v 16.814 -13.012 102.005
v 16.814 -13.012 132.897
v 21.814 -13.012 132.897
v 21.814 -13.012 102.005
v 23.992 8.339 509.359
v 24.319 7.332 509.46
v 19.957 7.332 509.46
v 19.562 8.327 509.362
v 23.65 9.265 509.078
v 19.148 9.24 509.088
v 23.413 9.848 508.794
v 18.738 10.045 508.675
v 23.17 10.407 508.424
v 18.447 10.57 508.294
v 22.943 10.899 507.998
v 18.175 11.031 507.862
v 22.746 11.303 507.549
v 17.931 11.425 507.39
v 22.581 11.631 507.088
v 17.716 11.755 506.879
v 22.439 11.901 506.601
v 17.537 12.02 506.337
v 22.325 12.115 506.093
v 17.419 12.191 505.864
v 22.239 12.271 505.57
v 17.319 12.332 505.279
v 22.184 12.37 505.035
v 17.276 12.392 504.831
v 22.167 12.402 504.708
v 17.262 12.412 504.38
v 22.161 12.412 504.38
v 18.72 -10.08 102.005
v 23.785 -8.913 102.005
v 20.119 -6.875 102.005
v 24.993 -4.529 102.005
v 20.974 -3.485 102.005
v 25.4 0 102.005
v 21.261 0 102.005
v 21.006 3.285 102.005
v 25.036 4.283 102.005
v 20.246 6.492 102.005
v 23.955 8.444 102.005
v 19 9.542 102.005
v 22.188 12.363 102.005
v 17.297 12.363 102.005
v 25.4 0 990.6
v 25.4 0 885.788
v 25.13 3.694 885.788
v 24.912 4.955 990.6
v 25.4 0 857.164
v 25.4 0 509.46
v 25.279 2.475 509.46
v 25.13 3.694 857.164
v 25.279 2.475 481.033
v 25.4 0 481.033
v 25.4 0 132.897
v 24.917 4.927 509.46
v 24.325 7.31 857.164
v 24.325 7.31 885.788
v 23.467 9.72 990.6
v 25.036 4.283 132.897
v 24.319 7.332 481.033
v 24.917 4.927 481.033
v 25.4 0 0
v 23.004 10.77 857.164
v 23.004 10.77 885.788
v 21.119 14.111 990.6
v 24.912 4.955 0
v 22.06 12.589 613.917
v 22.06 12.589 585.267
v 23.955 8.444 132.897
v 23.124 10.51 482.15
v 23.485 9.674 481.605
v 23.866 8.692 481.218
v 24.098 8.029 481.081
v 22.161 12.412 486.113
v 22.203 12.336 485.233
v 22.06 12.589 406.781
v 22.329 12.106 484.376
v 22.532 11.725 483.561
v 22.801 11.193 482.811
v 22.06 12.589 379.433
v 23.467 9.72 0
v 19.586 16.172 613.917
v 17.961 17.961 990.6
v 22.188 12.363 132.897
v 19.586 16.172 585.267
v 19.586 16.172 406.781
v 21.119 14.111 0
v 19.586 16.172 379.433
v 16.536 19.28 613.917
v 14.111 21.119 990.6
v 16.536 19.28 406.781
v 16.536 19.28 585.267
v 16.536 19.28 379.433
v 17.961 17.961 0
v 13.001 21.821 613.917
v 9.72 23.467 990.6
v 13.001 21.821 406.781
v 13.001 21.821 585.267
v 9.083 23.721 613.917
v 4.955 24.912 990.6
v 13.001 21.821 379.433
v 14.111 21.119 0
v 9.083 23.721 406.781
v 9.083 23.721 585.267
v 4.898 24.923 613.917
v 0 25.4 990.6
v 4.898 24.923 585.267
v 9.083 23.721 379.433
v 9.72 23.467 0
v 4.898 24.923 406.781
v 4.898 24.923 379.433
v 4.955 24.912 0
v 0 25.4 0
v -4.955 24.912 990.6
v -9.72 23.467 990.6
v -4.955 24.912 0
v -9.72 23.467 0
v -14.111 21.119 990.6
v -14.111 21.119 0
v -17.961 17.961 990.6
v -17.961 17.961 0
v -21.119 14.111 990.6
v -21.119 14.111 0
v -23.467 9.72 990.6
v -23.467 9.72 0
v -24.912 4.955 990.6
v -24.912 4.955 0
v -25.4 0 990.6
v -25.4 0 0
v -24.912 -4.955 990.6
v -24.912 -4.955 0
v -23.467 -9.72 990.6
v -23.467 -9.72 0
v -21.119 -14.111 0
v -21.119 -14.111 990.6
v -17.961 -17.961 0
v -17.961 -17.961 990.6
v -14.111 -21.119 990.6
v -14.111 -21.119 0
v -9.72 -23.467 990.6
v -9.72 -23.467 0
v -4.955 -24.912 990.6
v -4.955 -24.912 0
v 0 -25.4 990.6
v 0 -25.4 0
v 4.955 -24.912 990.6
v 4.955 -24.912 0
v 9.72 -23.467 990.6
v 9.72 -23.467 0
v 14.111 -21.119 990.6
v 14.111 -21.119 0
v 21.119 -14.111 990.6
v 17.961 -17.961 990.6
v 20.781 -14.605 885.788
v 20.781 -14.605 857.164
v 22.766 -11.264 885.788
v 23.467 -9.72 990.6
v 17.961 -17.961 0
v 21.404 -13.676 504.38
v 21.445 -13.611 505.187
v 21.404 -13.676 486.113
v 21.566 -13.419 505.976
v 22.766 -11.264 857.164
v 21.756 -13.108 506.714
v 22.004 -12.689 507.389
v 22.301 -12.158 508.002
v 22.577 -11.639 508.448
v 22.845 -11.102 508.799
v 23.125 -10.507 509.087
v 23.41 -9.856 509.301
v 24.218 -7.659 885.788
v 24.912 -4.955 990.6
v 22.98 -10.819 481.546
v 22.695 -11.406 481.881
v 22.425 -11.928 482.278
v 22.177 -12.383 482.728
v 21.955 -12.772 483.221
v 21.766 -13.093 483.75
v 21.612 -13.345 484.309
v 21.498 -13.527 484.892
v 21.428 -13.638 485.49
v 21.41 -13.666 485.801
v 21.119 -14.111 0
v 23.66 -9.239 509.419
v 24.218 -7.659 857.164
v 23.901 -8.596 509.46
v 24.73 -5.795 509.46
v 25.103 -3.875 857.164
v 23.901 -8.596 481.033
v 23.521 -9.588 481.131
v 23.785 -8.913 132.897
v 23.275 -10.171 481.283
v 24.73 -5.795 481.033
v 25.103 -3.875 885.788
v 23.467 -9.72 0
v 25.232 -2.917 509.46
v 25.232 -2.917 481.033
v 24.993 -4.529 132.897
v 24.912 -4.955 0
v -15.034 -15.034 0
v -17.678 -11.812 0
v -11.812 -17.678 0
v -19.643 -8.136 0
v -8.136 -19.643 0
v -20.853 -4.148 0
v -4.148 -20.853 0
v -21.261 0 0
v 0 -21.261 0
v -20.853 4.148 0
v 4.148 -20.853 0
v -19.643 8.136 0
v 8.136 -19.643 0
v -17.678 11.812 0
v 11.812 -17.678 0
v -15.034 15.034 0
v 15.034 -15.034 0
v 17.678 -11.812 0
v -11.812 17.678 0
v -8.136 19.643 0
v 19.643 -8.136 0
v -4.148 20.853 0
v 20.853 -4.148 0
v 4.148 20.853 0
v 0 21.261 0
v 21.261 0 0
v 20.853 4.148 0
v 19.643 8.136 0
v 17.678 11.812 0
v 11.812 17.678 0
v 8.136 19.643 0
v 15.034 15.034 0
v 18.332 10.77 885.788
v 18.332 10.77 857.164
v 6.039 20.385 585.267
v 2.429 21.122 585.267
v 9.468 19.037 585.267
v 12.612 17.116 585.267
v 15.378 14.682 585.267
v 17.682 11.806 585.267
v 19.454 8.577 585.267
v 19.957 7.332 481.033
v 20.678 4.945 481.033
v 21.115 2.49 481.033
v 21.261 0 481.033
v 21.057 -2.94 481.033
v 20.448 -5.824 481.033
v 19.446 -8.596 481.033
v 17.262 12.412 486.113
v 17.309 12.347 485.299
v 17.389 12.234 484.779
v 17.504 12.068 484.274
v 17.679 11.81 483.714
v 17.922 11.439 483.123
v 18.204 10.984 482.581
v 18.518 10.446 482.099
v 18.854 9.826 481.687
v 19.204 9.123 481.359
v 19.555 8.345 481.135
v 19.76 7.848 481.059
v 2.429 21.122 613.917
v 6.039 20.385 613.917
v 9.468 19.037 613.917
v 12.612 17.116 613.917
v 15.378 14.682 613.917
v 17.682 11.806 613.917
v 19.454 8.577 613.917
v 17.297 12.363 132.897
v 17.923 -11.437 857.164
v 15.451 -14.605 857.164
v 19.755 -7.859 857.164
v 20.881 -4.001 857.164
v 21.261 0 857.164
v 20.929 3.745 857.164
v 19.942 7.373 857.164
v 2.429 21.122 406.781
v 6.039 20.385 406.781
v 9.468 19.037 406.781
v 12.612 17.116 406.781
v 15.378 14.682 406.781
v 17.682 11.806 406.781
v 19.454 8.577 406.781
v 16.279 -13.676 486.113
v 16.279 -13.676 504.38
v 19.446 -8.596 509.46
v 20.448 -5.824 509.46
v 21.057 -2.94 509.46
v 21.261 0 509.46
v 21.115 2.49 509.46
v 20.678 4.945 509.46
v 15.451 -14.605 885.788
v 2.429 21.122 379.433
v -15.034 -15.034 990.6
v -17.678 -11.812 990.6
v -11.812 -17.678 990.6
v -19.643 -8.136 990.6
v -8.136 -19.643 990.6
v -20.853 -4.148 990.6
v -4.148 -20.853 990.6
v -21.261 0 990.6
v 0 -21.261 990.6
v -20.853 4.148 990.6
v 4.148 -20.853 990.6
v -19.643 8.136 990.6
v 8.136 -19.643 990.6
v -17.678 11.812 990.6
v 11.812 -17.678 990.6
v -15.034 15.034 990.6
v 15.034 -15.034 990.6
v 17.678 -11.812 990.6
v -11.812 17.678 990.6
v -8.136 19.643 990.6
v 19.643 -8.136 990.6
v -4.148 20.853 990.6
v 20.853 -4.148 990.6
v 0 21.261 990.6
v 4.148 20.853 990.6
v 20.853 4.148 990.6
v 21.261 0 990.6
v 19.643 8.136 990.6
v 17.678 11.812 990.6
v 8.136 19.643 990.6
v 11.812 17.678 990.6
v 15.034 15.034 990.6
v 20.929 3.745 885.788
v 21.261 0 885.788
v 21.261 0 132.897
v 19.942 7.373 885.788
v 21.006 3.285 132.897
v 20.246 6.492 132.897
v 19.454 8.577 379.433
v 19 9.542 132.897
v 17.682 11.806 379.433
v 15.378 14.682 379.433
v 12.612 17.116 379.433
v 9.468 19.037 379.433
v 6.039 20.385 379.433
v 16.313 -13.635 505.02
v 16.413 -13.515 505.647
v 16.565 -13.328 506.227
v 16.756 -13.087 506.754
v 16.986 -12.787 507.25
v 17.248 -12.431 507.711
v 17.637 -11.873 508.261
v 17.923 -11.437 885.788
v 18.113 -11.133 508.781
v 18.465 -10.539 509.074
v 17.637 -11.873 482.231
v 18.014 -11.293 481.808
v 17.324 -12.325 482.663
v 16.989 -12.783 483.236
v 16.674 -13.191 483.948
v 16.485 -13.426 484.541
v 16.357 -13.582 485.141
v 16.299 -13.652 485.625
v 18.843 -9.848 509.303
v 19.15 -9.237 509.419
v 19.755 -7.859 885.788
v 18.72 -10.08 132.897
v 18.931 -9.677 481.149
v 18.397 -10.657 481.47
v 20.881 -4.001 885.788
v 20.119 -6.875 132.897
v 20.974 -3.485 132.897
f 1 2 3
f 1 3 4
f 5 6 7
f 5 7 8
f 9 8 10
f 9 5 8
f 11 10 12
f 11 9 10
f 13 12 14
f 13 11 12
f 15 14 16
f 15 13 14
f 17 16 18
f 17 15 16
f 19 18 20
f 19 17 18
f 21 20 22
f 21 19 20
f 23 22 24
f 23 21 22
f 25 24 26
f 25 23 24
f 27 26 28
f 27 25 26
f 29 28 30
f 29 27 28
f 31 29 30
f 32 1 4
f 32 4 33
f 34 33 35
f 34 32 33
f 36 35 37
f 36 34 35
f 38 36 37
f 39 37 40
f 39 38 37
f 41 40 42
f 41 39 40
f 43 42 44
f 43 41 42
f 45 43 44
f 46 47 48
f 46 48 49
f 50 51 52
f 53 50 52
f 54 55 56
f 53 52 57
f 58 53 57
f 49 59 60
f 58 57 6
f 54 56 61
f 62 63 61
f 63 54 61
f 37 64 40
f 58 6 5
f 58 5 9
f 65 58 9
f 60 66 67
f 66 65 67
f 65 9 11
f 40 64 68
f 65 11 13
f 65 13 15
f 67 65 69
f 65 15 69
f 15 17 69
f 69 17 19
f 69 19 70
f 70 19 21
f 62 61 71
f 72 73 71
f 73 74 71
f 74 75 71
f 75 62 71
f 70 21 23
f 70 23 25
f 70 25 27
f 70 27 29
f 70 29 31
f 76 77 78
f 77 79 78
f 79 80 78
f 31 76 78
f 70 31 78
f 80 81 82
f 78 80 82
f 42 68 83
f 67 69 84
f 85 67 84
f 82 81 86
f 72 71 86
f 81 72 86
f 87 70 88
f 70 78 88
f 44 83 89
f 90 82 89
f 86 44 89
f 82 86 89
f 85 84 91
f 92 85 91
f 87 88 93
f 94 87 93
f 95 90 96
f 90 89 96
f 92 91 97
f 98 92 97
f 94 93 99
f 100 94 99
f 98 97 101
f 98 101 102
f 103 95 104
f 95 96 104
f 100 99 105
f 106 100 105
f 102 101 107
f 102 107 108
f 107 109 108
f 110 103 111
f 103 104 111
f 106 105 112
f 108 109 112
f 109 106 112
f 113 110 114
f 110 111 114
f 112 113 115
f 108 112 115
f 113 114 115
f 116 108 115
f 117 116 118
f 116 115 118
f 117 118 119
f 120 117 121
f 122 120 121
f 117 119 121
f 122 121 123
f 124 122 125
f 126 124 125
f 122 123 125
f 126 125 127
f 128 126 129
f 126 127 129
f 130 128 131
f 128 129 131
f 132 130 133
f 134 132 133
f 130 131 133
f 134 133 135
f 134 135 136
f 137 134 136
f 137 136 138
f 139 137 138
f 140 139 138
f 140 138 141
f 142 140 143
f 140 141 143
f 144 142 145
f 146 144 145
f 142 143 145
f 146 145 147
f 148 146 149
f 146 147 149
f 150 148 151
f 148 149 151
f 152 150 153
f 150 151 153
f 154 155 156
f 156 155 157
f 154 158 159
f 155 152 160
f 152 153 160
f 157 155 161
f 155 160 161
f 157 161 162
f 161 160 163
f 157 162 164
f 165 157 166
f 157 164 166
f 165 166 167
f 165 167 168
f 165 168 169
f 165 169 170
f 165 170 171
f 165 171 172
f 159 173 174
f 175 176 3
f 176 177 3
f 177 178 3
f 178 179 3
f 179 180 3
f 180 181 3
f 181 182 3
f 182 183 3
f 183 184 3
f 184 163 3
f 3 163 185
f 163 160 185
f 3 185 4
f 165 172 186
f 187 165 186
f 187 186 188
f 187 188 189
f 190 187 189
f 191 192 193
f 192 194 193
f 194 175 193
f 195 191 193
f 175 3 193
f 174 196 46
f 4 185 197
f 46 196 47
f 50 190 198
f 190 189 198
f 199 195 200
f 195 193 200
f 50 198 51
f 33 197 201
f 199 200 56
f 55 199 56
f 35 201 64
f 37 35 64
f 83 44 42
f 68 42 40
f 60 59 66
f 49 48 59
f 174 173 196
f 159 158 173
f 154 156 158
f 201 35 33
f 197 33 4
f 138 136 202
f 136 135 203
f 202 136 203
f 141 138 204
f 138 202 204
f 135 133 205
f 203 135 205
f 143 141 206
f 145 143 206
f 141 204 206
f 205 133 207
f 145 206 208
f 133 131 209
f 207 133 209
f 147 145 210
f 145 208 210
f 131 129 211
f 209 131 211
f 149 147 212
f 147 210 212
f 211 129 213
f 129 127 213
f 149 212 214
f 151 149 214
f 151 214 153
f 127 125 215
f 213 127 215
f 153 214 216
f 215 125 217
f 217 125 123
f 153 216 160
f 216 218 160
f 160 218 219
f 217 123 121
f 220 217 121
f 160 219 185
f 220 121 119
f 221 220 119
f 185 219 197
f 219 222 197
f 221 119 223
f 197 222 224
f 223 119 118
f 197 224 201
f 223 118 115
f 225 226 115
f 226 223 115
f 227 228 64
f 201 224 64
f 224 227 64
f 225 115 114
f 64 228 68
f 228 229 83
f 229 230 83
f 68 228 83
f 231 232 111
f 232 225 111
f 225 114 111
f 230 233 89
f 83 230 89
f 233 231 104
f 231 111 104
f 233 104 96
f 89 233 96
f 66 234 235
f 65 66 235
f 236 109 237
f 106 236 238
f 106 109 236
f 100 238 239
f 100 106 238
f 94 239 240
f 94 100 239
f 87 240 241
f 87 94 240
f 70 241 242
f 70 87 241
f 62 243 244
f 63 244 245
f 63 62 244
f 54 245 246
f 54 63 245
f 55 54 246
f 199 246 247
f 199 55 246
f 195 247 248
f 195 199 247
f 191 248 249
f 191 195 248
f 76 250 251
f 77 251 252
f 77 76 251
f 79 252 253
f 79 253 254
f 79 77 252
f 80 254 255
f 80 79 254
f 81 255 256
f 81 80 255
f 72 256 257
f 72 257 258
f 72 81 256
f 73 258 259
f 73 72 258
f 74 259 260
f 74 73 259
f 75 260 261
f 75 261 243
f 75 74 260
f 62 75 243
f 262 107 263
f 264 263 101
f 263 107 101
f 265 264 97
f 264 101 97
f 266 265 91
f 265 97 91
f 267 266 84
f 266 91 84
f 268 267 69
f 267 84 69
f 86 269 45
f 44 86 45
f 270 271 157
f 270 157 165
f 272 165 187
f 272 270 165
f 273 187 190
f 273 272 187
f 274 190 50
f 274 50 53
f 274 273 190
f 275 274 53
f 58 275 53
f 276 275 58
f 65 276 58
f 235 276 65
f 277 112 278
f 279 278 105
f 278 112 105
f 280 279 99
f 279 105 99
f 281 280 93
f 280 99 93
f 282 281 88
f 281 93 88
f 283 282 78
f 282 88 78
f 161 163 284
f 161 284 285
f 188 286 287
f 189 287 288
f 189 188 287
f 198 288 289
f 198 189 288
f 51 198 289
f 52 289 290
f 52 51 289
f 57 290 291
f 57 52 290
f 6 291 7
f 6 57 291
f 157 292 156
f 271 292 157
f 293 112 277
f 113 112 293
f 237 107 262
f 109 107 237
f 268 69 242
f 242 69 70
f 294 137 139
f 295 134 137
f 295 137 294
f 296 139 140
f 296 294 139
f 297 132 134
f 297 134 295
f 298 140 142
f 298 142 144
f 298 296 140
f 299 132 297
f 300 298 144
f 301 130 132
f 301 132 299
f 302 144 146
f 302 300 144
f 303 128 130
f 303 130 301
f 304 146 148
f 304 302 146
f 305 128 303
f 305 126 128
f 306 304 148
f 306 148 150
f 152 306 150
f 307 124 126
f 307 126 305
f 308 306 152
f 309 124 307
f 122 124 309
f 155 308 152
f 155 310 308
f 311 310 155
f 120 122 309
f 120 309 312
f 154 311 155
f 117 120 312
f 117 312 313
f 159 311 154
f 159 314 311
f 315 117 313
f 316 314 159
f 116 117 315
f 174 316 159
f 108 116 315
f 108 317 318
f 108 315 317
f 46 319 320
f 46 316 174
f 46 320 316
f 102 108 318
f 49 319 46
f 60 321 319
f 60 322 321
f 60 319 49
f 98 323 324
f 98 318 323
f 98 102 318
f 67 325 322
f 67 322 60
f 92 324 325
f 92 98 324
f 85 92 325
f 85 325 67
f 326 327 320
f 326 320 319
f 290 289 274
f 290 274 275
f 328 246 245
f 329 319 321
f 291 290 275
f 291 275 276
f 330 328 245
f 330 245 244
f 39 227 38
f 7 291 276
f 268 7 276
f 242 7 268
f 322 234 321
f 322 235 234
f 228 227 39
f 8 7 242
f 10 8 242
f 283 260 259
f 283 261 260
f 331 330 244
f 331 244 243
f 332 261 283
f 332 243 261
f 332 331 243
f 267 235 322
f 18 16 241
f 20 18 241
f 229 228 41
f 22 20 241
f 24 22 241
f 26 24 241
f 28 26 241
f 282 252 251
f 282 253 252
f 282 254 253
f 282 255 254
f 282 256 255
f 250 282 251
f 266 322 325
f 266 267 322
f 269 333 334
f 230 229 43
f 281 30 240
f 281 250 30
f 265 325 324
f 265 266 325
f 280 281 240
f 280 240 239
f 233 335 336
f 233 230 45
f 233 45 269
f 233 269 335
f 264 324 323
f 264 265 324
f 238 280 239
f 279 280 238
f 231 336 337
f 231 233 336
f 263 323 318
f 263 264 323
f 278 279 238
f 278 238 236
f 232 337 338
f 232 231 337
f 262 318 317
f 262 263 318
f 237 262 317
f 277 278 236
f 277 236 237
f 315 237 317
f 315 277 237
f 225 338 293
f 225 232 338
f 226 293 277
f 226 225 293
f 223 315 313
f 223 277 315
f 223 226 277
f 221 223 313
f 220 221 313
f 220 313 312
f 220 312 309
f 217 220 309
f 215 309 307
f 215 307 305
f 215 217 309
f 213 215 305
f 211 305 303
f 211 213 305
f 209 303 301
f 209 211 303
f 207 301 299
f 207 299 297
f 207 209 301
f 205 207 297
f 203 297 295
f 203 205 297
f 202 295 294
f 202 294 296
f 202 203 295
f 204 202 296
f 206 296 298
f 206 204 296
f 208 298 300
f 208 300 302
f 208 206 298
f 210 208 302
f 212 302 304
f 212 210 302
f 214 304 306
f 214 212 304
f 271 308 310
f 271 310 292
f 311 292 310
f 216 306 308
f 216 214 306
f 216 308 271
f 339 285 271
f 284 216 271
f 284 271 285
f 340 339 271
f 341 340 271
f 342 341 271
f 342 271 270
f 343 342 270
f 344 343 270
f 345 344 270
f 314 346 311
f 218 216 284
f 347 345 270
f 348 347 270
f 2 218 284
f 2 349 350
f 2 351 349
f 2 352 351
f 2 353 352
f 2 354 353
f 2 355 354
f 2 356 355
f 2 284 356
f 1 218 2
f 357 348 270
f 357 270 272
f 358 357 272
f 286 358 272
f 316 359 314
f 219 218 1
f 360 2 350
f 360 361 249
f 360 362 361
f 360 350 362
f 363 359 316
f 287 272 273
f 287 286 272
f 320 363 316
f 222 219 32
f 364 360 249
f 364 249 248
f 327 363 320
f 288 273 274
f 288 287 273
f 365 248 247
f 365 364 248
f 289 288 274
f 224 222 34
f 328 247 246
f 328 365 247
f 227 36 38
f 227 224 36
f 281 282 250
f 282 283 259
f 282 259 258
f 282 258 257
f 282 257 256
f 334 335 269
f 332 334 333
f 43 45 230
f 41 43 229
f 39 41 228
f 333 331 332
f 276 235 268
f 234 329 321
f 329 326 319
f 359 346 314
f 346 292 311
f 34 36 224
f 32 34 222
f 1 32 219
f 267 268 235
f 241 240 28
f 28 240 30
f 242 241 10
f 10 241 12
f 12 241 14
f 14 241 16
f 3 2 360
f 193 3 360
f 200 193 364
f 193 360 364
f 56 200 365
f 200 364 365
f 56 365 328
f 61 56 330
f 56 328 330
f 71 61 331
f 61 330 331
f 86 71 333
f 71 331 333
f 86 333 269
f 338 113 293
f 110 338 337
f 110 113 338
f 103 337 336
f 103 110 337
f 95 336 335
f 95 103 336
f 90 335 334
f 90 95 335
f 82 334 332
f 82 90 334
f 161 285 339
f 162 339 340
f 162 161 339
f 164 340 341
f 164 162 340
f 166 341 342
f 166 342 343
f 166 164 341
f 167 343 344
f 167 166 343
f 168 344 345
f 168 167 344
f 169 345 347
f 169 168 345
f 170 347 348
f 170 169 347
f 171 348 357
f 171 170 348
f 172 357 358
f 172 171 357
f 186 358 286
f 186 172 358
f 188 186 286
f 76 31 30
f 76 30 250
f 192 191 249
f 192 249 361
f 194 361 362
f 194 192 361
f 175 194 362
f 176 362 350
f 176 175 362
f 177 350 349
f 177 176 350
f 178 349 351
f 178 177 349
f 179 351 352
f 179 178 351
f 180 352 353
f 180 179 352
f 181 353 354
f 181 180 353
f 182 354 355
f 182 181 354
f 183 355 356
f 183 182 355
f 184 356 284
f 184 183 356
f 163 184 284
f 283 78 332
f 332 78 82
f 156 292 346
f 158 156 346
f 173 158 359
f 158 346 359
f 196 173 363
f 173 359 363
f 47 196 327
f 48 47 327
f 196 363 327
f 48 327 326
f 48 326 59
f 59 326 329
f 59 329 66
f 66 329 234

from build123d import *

# Parameters (mm, degrees)
SKETCH1_R           = 25.4
SKETCH1_R_2         = 21.261108016
BOSS_EXTRUDE1_DEPTH = 990.6
SKETCH2_W           = 28.624747861
SKETCH2_H           = 25.375038237
SKETCH2_W_2         = 30.891350897
CUT_EXTRUDE1_DEPTH  = 134.112
SKETCH4_W           = 21.111143717
SKETCH4_H           = 28.650837901
SKETCH4_H_2         = 27.348431128
CUT_EXTRUDE3_DEPTH  = 26.416
CUT_EXTRUDE4_DEPTH  = 54.864


with BuildPart() as part:
    # Sketch1 → Boss-Extrude1 (new body)
    with BuildSketch(Plane.XY):
        Circle(SKETCH1_R)
        Circle(SKETCH1_R_2, mode=Mode.SUBTRACT)
    extrude(amount=BOSS_EXTRUDE1_DEPTH)

    # Sketch2 → Cut-Extrude1 (cut)
    with BuildSketch(Plane(origin=(0, 0, 0), x_dir=(0, 0, -1), z_dir=(1, 0, 0))):
        with Locations((-871.475907431, -1.917628622)):
            Rectangle(SKETCH2_W, SKETCH2_H)
        with Locations((-117.451174558, -0.32438411)):
            Rectangle(SKETCH2_W_2, SKETCH2_H)
    extrude(amount=CUT_EXTRUDE1_DEPTH, mode=Mode.SUBTRACT)

    # Sketch4 → Cut-Extrude3 (cut)
    with BuildSketch(Plane(origin=(20.34275841, 31.325100943, 990.6), x_dir=(0.8386705679454252, -0.5446390350150252, 0), z_dir=(0.5446390350150253, 0.8386705679454253, 0))):
        with Locations((1.089203724, 391.007961831)):
            Rectangle(SKETCH4_W, SKETCH4_H)
        with Locations((1.089203724, 597.492816454)):
            Rectangle(SKETCH4_W, SKETCH4_H_2)
    extrude(amount=-CUT_EXTRUDE3_DEPTH, mode=Mode.SUBTRACT)

    # Sketch5 → Cut-Extrude4 (cut)
    with BuildSketch(Plane(origin=(54.696152621, 0, 0), x_dir=(0, 0, -1), z_dir=(1, 0, 0))):
        with BuildLine():
            Line((-504.379993857, 12.412385949), (-486.113069106, 12.412385949))
            ThreePointArc((-486.113069106, 12.412385949), (-482.520966658, 10.924488397), (-481.033069106, 7.332385949))
            Line((-481.033069106, 7.332385949), (-481.033069106, -8.595883791))
            ThreePointArc((-481.033069106, -8.595883791), (-482.520966658, -12.187986239), (-486.113069106, -13.675883791))
            Line((-486.113069106, -13.675883791), (-504.379993857, -13.675883791))
            ThreePointArc((-504.379993857, -13.675883791), (-507.972096305, -12.187986239), (-509.459993857, -8.595883791))
            Line((-509.459993857, -8.595883791), (-509.459993857, 7.332385949))
            ThreePointArc((-509.459993857, 7.332385949), (-507.972096305, 10.924488397), (-504.379993857, 12.412385949))
        make_face()
    extrude(amount=-CUT_EXTRUDE4_DEPTH, mode=Mode.SUBTRACT)


solid = part.part
